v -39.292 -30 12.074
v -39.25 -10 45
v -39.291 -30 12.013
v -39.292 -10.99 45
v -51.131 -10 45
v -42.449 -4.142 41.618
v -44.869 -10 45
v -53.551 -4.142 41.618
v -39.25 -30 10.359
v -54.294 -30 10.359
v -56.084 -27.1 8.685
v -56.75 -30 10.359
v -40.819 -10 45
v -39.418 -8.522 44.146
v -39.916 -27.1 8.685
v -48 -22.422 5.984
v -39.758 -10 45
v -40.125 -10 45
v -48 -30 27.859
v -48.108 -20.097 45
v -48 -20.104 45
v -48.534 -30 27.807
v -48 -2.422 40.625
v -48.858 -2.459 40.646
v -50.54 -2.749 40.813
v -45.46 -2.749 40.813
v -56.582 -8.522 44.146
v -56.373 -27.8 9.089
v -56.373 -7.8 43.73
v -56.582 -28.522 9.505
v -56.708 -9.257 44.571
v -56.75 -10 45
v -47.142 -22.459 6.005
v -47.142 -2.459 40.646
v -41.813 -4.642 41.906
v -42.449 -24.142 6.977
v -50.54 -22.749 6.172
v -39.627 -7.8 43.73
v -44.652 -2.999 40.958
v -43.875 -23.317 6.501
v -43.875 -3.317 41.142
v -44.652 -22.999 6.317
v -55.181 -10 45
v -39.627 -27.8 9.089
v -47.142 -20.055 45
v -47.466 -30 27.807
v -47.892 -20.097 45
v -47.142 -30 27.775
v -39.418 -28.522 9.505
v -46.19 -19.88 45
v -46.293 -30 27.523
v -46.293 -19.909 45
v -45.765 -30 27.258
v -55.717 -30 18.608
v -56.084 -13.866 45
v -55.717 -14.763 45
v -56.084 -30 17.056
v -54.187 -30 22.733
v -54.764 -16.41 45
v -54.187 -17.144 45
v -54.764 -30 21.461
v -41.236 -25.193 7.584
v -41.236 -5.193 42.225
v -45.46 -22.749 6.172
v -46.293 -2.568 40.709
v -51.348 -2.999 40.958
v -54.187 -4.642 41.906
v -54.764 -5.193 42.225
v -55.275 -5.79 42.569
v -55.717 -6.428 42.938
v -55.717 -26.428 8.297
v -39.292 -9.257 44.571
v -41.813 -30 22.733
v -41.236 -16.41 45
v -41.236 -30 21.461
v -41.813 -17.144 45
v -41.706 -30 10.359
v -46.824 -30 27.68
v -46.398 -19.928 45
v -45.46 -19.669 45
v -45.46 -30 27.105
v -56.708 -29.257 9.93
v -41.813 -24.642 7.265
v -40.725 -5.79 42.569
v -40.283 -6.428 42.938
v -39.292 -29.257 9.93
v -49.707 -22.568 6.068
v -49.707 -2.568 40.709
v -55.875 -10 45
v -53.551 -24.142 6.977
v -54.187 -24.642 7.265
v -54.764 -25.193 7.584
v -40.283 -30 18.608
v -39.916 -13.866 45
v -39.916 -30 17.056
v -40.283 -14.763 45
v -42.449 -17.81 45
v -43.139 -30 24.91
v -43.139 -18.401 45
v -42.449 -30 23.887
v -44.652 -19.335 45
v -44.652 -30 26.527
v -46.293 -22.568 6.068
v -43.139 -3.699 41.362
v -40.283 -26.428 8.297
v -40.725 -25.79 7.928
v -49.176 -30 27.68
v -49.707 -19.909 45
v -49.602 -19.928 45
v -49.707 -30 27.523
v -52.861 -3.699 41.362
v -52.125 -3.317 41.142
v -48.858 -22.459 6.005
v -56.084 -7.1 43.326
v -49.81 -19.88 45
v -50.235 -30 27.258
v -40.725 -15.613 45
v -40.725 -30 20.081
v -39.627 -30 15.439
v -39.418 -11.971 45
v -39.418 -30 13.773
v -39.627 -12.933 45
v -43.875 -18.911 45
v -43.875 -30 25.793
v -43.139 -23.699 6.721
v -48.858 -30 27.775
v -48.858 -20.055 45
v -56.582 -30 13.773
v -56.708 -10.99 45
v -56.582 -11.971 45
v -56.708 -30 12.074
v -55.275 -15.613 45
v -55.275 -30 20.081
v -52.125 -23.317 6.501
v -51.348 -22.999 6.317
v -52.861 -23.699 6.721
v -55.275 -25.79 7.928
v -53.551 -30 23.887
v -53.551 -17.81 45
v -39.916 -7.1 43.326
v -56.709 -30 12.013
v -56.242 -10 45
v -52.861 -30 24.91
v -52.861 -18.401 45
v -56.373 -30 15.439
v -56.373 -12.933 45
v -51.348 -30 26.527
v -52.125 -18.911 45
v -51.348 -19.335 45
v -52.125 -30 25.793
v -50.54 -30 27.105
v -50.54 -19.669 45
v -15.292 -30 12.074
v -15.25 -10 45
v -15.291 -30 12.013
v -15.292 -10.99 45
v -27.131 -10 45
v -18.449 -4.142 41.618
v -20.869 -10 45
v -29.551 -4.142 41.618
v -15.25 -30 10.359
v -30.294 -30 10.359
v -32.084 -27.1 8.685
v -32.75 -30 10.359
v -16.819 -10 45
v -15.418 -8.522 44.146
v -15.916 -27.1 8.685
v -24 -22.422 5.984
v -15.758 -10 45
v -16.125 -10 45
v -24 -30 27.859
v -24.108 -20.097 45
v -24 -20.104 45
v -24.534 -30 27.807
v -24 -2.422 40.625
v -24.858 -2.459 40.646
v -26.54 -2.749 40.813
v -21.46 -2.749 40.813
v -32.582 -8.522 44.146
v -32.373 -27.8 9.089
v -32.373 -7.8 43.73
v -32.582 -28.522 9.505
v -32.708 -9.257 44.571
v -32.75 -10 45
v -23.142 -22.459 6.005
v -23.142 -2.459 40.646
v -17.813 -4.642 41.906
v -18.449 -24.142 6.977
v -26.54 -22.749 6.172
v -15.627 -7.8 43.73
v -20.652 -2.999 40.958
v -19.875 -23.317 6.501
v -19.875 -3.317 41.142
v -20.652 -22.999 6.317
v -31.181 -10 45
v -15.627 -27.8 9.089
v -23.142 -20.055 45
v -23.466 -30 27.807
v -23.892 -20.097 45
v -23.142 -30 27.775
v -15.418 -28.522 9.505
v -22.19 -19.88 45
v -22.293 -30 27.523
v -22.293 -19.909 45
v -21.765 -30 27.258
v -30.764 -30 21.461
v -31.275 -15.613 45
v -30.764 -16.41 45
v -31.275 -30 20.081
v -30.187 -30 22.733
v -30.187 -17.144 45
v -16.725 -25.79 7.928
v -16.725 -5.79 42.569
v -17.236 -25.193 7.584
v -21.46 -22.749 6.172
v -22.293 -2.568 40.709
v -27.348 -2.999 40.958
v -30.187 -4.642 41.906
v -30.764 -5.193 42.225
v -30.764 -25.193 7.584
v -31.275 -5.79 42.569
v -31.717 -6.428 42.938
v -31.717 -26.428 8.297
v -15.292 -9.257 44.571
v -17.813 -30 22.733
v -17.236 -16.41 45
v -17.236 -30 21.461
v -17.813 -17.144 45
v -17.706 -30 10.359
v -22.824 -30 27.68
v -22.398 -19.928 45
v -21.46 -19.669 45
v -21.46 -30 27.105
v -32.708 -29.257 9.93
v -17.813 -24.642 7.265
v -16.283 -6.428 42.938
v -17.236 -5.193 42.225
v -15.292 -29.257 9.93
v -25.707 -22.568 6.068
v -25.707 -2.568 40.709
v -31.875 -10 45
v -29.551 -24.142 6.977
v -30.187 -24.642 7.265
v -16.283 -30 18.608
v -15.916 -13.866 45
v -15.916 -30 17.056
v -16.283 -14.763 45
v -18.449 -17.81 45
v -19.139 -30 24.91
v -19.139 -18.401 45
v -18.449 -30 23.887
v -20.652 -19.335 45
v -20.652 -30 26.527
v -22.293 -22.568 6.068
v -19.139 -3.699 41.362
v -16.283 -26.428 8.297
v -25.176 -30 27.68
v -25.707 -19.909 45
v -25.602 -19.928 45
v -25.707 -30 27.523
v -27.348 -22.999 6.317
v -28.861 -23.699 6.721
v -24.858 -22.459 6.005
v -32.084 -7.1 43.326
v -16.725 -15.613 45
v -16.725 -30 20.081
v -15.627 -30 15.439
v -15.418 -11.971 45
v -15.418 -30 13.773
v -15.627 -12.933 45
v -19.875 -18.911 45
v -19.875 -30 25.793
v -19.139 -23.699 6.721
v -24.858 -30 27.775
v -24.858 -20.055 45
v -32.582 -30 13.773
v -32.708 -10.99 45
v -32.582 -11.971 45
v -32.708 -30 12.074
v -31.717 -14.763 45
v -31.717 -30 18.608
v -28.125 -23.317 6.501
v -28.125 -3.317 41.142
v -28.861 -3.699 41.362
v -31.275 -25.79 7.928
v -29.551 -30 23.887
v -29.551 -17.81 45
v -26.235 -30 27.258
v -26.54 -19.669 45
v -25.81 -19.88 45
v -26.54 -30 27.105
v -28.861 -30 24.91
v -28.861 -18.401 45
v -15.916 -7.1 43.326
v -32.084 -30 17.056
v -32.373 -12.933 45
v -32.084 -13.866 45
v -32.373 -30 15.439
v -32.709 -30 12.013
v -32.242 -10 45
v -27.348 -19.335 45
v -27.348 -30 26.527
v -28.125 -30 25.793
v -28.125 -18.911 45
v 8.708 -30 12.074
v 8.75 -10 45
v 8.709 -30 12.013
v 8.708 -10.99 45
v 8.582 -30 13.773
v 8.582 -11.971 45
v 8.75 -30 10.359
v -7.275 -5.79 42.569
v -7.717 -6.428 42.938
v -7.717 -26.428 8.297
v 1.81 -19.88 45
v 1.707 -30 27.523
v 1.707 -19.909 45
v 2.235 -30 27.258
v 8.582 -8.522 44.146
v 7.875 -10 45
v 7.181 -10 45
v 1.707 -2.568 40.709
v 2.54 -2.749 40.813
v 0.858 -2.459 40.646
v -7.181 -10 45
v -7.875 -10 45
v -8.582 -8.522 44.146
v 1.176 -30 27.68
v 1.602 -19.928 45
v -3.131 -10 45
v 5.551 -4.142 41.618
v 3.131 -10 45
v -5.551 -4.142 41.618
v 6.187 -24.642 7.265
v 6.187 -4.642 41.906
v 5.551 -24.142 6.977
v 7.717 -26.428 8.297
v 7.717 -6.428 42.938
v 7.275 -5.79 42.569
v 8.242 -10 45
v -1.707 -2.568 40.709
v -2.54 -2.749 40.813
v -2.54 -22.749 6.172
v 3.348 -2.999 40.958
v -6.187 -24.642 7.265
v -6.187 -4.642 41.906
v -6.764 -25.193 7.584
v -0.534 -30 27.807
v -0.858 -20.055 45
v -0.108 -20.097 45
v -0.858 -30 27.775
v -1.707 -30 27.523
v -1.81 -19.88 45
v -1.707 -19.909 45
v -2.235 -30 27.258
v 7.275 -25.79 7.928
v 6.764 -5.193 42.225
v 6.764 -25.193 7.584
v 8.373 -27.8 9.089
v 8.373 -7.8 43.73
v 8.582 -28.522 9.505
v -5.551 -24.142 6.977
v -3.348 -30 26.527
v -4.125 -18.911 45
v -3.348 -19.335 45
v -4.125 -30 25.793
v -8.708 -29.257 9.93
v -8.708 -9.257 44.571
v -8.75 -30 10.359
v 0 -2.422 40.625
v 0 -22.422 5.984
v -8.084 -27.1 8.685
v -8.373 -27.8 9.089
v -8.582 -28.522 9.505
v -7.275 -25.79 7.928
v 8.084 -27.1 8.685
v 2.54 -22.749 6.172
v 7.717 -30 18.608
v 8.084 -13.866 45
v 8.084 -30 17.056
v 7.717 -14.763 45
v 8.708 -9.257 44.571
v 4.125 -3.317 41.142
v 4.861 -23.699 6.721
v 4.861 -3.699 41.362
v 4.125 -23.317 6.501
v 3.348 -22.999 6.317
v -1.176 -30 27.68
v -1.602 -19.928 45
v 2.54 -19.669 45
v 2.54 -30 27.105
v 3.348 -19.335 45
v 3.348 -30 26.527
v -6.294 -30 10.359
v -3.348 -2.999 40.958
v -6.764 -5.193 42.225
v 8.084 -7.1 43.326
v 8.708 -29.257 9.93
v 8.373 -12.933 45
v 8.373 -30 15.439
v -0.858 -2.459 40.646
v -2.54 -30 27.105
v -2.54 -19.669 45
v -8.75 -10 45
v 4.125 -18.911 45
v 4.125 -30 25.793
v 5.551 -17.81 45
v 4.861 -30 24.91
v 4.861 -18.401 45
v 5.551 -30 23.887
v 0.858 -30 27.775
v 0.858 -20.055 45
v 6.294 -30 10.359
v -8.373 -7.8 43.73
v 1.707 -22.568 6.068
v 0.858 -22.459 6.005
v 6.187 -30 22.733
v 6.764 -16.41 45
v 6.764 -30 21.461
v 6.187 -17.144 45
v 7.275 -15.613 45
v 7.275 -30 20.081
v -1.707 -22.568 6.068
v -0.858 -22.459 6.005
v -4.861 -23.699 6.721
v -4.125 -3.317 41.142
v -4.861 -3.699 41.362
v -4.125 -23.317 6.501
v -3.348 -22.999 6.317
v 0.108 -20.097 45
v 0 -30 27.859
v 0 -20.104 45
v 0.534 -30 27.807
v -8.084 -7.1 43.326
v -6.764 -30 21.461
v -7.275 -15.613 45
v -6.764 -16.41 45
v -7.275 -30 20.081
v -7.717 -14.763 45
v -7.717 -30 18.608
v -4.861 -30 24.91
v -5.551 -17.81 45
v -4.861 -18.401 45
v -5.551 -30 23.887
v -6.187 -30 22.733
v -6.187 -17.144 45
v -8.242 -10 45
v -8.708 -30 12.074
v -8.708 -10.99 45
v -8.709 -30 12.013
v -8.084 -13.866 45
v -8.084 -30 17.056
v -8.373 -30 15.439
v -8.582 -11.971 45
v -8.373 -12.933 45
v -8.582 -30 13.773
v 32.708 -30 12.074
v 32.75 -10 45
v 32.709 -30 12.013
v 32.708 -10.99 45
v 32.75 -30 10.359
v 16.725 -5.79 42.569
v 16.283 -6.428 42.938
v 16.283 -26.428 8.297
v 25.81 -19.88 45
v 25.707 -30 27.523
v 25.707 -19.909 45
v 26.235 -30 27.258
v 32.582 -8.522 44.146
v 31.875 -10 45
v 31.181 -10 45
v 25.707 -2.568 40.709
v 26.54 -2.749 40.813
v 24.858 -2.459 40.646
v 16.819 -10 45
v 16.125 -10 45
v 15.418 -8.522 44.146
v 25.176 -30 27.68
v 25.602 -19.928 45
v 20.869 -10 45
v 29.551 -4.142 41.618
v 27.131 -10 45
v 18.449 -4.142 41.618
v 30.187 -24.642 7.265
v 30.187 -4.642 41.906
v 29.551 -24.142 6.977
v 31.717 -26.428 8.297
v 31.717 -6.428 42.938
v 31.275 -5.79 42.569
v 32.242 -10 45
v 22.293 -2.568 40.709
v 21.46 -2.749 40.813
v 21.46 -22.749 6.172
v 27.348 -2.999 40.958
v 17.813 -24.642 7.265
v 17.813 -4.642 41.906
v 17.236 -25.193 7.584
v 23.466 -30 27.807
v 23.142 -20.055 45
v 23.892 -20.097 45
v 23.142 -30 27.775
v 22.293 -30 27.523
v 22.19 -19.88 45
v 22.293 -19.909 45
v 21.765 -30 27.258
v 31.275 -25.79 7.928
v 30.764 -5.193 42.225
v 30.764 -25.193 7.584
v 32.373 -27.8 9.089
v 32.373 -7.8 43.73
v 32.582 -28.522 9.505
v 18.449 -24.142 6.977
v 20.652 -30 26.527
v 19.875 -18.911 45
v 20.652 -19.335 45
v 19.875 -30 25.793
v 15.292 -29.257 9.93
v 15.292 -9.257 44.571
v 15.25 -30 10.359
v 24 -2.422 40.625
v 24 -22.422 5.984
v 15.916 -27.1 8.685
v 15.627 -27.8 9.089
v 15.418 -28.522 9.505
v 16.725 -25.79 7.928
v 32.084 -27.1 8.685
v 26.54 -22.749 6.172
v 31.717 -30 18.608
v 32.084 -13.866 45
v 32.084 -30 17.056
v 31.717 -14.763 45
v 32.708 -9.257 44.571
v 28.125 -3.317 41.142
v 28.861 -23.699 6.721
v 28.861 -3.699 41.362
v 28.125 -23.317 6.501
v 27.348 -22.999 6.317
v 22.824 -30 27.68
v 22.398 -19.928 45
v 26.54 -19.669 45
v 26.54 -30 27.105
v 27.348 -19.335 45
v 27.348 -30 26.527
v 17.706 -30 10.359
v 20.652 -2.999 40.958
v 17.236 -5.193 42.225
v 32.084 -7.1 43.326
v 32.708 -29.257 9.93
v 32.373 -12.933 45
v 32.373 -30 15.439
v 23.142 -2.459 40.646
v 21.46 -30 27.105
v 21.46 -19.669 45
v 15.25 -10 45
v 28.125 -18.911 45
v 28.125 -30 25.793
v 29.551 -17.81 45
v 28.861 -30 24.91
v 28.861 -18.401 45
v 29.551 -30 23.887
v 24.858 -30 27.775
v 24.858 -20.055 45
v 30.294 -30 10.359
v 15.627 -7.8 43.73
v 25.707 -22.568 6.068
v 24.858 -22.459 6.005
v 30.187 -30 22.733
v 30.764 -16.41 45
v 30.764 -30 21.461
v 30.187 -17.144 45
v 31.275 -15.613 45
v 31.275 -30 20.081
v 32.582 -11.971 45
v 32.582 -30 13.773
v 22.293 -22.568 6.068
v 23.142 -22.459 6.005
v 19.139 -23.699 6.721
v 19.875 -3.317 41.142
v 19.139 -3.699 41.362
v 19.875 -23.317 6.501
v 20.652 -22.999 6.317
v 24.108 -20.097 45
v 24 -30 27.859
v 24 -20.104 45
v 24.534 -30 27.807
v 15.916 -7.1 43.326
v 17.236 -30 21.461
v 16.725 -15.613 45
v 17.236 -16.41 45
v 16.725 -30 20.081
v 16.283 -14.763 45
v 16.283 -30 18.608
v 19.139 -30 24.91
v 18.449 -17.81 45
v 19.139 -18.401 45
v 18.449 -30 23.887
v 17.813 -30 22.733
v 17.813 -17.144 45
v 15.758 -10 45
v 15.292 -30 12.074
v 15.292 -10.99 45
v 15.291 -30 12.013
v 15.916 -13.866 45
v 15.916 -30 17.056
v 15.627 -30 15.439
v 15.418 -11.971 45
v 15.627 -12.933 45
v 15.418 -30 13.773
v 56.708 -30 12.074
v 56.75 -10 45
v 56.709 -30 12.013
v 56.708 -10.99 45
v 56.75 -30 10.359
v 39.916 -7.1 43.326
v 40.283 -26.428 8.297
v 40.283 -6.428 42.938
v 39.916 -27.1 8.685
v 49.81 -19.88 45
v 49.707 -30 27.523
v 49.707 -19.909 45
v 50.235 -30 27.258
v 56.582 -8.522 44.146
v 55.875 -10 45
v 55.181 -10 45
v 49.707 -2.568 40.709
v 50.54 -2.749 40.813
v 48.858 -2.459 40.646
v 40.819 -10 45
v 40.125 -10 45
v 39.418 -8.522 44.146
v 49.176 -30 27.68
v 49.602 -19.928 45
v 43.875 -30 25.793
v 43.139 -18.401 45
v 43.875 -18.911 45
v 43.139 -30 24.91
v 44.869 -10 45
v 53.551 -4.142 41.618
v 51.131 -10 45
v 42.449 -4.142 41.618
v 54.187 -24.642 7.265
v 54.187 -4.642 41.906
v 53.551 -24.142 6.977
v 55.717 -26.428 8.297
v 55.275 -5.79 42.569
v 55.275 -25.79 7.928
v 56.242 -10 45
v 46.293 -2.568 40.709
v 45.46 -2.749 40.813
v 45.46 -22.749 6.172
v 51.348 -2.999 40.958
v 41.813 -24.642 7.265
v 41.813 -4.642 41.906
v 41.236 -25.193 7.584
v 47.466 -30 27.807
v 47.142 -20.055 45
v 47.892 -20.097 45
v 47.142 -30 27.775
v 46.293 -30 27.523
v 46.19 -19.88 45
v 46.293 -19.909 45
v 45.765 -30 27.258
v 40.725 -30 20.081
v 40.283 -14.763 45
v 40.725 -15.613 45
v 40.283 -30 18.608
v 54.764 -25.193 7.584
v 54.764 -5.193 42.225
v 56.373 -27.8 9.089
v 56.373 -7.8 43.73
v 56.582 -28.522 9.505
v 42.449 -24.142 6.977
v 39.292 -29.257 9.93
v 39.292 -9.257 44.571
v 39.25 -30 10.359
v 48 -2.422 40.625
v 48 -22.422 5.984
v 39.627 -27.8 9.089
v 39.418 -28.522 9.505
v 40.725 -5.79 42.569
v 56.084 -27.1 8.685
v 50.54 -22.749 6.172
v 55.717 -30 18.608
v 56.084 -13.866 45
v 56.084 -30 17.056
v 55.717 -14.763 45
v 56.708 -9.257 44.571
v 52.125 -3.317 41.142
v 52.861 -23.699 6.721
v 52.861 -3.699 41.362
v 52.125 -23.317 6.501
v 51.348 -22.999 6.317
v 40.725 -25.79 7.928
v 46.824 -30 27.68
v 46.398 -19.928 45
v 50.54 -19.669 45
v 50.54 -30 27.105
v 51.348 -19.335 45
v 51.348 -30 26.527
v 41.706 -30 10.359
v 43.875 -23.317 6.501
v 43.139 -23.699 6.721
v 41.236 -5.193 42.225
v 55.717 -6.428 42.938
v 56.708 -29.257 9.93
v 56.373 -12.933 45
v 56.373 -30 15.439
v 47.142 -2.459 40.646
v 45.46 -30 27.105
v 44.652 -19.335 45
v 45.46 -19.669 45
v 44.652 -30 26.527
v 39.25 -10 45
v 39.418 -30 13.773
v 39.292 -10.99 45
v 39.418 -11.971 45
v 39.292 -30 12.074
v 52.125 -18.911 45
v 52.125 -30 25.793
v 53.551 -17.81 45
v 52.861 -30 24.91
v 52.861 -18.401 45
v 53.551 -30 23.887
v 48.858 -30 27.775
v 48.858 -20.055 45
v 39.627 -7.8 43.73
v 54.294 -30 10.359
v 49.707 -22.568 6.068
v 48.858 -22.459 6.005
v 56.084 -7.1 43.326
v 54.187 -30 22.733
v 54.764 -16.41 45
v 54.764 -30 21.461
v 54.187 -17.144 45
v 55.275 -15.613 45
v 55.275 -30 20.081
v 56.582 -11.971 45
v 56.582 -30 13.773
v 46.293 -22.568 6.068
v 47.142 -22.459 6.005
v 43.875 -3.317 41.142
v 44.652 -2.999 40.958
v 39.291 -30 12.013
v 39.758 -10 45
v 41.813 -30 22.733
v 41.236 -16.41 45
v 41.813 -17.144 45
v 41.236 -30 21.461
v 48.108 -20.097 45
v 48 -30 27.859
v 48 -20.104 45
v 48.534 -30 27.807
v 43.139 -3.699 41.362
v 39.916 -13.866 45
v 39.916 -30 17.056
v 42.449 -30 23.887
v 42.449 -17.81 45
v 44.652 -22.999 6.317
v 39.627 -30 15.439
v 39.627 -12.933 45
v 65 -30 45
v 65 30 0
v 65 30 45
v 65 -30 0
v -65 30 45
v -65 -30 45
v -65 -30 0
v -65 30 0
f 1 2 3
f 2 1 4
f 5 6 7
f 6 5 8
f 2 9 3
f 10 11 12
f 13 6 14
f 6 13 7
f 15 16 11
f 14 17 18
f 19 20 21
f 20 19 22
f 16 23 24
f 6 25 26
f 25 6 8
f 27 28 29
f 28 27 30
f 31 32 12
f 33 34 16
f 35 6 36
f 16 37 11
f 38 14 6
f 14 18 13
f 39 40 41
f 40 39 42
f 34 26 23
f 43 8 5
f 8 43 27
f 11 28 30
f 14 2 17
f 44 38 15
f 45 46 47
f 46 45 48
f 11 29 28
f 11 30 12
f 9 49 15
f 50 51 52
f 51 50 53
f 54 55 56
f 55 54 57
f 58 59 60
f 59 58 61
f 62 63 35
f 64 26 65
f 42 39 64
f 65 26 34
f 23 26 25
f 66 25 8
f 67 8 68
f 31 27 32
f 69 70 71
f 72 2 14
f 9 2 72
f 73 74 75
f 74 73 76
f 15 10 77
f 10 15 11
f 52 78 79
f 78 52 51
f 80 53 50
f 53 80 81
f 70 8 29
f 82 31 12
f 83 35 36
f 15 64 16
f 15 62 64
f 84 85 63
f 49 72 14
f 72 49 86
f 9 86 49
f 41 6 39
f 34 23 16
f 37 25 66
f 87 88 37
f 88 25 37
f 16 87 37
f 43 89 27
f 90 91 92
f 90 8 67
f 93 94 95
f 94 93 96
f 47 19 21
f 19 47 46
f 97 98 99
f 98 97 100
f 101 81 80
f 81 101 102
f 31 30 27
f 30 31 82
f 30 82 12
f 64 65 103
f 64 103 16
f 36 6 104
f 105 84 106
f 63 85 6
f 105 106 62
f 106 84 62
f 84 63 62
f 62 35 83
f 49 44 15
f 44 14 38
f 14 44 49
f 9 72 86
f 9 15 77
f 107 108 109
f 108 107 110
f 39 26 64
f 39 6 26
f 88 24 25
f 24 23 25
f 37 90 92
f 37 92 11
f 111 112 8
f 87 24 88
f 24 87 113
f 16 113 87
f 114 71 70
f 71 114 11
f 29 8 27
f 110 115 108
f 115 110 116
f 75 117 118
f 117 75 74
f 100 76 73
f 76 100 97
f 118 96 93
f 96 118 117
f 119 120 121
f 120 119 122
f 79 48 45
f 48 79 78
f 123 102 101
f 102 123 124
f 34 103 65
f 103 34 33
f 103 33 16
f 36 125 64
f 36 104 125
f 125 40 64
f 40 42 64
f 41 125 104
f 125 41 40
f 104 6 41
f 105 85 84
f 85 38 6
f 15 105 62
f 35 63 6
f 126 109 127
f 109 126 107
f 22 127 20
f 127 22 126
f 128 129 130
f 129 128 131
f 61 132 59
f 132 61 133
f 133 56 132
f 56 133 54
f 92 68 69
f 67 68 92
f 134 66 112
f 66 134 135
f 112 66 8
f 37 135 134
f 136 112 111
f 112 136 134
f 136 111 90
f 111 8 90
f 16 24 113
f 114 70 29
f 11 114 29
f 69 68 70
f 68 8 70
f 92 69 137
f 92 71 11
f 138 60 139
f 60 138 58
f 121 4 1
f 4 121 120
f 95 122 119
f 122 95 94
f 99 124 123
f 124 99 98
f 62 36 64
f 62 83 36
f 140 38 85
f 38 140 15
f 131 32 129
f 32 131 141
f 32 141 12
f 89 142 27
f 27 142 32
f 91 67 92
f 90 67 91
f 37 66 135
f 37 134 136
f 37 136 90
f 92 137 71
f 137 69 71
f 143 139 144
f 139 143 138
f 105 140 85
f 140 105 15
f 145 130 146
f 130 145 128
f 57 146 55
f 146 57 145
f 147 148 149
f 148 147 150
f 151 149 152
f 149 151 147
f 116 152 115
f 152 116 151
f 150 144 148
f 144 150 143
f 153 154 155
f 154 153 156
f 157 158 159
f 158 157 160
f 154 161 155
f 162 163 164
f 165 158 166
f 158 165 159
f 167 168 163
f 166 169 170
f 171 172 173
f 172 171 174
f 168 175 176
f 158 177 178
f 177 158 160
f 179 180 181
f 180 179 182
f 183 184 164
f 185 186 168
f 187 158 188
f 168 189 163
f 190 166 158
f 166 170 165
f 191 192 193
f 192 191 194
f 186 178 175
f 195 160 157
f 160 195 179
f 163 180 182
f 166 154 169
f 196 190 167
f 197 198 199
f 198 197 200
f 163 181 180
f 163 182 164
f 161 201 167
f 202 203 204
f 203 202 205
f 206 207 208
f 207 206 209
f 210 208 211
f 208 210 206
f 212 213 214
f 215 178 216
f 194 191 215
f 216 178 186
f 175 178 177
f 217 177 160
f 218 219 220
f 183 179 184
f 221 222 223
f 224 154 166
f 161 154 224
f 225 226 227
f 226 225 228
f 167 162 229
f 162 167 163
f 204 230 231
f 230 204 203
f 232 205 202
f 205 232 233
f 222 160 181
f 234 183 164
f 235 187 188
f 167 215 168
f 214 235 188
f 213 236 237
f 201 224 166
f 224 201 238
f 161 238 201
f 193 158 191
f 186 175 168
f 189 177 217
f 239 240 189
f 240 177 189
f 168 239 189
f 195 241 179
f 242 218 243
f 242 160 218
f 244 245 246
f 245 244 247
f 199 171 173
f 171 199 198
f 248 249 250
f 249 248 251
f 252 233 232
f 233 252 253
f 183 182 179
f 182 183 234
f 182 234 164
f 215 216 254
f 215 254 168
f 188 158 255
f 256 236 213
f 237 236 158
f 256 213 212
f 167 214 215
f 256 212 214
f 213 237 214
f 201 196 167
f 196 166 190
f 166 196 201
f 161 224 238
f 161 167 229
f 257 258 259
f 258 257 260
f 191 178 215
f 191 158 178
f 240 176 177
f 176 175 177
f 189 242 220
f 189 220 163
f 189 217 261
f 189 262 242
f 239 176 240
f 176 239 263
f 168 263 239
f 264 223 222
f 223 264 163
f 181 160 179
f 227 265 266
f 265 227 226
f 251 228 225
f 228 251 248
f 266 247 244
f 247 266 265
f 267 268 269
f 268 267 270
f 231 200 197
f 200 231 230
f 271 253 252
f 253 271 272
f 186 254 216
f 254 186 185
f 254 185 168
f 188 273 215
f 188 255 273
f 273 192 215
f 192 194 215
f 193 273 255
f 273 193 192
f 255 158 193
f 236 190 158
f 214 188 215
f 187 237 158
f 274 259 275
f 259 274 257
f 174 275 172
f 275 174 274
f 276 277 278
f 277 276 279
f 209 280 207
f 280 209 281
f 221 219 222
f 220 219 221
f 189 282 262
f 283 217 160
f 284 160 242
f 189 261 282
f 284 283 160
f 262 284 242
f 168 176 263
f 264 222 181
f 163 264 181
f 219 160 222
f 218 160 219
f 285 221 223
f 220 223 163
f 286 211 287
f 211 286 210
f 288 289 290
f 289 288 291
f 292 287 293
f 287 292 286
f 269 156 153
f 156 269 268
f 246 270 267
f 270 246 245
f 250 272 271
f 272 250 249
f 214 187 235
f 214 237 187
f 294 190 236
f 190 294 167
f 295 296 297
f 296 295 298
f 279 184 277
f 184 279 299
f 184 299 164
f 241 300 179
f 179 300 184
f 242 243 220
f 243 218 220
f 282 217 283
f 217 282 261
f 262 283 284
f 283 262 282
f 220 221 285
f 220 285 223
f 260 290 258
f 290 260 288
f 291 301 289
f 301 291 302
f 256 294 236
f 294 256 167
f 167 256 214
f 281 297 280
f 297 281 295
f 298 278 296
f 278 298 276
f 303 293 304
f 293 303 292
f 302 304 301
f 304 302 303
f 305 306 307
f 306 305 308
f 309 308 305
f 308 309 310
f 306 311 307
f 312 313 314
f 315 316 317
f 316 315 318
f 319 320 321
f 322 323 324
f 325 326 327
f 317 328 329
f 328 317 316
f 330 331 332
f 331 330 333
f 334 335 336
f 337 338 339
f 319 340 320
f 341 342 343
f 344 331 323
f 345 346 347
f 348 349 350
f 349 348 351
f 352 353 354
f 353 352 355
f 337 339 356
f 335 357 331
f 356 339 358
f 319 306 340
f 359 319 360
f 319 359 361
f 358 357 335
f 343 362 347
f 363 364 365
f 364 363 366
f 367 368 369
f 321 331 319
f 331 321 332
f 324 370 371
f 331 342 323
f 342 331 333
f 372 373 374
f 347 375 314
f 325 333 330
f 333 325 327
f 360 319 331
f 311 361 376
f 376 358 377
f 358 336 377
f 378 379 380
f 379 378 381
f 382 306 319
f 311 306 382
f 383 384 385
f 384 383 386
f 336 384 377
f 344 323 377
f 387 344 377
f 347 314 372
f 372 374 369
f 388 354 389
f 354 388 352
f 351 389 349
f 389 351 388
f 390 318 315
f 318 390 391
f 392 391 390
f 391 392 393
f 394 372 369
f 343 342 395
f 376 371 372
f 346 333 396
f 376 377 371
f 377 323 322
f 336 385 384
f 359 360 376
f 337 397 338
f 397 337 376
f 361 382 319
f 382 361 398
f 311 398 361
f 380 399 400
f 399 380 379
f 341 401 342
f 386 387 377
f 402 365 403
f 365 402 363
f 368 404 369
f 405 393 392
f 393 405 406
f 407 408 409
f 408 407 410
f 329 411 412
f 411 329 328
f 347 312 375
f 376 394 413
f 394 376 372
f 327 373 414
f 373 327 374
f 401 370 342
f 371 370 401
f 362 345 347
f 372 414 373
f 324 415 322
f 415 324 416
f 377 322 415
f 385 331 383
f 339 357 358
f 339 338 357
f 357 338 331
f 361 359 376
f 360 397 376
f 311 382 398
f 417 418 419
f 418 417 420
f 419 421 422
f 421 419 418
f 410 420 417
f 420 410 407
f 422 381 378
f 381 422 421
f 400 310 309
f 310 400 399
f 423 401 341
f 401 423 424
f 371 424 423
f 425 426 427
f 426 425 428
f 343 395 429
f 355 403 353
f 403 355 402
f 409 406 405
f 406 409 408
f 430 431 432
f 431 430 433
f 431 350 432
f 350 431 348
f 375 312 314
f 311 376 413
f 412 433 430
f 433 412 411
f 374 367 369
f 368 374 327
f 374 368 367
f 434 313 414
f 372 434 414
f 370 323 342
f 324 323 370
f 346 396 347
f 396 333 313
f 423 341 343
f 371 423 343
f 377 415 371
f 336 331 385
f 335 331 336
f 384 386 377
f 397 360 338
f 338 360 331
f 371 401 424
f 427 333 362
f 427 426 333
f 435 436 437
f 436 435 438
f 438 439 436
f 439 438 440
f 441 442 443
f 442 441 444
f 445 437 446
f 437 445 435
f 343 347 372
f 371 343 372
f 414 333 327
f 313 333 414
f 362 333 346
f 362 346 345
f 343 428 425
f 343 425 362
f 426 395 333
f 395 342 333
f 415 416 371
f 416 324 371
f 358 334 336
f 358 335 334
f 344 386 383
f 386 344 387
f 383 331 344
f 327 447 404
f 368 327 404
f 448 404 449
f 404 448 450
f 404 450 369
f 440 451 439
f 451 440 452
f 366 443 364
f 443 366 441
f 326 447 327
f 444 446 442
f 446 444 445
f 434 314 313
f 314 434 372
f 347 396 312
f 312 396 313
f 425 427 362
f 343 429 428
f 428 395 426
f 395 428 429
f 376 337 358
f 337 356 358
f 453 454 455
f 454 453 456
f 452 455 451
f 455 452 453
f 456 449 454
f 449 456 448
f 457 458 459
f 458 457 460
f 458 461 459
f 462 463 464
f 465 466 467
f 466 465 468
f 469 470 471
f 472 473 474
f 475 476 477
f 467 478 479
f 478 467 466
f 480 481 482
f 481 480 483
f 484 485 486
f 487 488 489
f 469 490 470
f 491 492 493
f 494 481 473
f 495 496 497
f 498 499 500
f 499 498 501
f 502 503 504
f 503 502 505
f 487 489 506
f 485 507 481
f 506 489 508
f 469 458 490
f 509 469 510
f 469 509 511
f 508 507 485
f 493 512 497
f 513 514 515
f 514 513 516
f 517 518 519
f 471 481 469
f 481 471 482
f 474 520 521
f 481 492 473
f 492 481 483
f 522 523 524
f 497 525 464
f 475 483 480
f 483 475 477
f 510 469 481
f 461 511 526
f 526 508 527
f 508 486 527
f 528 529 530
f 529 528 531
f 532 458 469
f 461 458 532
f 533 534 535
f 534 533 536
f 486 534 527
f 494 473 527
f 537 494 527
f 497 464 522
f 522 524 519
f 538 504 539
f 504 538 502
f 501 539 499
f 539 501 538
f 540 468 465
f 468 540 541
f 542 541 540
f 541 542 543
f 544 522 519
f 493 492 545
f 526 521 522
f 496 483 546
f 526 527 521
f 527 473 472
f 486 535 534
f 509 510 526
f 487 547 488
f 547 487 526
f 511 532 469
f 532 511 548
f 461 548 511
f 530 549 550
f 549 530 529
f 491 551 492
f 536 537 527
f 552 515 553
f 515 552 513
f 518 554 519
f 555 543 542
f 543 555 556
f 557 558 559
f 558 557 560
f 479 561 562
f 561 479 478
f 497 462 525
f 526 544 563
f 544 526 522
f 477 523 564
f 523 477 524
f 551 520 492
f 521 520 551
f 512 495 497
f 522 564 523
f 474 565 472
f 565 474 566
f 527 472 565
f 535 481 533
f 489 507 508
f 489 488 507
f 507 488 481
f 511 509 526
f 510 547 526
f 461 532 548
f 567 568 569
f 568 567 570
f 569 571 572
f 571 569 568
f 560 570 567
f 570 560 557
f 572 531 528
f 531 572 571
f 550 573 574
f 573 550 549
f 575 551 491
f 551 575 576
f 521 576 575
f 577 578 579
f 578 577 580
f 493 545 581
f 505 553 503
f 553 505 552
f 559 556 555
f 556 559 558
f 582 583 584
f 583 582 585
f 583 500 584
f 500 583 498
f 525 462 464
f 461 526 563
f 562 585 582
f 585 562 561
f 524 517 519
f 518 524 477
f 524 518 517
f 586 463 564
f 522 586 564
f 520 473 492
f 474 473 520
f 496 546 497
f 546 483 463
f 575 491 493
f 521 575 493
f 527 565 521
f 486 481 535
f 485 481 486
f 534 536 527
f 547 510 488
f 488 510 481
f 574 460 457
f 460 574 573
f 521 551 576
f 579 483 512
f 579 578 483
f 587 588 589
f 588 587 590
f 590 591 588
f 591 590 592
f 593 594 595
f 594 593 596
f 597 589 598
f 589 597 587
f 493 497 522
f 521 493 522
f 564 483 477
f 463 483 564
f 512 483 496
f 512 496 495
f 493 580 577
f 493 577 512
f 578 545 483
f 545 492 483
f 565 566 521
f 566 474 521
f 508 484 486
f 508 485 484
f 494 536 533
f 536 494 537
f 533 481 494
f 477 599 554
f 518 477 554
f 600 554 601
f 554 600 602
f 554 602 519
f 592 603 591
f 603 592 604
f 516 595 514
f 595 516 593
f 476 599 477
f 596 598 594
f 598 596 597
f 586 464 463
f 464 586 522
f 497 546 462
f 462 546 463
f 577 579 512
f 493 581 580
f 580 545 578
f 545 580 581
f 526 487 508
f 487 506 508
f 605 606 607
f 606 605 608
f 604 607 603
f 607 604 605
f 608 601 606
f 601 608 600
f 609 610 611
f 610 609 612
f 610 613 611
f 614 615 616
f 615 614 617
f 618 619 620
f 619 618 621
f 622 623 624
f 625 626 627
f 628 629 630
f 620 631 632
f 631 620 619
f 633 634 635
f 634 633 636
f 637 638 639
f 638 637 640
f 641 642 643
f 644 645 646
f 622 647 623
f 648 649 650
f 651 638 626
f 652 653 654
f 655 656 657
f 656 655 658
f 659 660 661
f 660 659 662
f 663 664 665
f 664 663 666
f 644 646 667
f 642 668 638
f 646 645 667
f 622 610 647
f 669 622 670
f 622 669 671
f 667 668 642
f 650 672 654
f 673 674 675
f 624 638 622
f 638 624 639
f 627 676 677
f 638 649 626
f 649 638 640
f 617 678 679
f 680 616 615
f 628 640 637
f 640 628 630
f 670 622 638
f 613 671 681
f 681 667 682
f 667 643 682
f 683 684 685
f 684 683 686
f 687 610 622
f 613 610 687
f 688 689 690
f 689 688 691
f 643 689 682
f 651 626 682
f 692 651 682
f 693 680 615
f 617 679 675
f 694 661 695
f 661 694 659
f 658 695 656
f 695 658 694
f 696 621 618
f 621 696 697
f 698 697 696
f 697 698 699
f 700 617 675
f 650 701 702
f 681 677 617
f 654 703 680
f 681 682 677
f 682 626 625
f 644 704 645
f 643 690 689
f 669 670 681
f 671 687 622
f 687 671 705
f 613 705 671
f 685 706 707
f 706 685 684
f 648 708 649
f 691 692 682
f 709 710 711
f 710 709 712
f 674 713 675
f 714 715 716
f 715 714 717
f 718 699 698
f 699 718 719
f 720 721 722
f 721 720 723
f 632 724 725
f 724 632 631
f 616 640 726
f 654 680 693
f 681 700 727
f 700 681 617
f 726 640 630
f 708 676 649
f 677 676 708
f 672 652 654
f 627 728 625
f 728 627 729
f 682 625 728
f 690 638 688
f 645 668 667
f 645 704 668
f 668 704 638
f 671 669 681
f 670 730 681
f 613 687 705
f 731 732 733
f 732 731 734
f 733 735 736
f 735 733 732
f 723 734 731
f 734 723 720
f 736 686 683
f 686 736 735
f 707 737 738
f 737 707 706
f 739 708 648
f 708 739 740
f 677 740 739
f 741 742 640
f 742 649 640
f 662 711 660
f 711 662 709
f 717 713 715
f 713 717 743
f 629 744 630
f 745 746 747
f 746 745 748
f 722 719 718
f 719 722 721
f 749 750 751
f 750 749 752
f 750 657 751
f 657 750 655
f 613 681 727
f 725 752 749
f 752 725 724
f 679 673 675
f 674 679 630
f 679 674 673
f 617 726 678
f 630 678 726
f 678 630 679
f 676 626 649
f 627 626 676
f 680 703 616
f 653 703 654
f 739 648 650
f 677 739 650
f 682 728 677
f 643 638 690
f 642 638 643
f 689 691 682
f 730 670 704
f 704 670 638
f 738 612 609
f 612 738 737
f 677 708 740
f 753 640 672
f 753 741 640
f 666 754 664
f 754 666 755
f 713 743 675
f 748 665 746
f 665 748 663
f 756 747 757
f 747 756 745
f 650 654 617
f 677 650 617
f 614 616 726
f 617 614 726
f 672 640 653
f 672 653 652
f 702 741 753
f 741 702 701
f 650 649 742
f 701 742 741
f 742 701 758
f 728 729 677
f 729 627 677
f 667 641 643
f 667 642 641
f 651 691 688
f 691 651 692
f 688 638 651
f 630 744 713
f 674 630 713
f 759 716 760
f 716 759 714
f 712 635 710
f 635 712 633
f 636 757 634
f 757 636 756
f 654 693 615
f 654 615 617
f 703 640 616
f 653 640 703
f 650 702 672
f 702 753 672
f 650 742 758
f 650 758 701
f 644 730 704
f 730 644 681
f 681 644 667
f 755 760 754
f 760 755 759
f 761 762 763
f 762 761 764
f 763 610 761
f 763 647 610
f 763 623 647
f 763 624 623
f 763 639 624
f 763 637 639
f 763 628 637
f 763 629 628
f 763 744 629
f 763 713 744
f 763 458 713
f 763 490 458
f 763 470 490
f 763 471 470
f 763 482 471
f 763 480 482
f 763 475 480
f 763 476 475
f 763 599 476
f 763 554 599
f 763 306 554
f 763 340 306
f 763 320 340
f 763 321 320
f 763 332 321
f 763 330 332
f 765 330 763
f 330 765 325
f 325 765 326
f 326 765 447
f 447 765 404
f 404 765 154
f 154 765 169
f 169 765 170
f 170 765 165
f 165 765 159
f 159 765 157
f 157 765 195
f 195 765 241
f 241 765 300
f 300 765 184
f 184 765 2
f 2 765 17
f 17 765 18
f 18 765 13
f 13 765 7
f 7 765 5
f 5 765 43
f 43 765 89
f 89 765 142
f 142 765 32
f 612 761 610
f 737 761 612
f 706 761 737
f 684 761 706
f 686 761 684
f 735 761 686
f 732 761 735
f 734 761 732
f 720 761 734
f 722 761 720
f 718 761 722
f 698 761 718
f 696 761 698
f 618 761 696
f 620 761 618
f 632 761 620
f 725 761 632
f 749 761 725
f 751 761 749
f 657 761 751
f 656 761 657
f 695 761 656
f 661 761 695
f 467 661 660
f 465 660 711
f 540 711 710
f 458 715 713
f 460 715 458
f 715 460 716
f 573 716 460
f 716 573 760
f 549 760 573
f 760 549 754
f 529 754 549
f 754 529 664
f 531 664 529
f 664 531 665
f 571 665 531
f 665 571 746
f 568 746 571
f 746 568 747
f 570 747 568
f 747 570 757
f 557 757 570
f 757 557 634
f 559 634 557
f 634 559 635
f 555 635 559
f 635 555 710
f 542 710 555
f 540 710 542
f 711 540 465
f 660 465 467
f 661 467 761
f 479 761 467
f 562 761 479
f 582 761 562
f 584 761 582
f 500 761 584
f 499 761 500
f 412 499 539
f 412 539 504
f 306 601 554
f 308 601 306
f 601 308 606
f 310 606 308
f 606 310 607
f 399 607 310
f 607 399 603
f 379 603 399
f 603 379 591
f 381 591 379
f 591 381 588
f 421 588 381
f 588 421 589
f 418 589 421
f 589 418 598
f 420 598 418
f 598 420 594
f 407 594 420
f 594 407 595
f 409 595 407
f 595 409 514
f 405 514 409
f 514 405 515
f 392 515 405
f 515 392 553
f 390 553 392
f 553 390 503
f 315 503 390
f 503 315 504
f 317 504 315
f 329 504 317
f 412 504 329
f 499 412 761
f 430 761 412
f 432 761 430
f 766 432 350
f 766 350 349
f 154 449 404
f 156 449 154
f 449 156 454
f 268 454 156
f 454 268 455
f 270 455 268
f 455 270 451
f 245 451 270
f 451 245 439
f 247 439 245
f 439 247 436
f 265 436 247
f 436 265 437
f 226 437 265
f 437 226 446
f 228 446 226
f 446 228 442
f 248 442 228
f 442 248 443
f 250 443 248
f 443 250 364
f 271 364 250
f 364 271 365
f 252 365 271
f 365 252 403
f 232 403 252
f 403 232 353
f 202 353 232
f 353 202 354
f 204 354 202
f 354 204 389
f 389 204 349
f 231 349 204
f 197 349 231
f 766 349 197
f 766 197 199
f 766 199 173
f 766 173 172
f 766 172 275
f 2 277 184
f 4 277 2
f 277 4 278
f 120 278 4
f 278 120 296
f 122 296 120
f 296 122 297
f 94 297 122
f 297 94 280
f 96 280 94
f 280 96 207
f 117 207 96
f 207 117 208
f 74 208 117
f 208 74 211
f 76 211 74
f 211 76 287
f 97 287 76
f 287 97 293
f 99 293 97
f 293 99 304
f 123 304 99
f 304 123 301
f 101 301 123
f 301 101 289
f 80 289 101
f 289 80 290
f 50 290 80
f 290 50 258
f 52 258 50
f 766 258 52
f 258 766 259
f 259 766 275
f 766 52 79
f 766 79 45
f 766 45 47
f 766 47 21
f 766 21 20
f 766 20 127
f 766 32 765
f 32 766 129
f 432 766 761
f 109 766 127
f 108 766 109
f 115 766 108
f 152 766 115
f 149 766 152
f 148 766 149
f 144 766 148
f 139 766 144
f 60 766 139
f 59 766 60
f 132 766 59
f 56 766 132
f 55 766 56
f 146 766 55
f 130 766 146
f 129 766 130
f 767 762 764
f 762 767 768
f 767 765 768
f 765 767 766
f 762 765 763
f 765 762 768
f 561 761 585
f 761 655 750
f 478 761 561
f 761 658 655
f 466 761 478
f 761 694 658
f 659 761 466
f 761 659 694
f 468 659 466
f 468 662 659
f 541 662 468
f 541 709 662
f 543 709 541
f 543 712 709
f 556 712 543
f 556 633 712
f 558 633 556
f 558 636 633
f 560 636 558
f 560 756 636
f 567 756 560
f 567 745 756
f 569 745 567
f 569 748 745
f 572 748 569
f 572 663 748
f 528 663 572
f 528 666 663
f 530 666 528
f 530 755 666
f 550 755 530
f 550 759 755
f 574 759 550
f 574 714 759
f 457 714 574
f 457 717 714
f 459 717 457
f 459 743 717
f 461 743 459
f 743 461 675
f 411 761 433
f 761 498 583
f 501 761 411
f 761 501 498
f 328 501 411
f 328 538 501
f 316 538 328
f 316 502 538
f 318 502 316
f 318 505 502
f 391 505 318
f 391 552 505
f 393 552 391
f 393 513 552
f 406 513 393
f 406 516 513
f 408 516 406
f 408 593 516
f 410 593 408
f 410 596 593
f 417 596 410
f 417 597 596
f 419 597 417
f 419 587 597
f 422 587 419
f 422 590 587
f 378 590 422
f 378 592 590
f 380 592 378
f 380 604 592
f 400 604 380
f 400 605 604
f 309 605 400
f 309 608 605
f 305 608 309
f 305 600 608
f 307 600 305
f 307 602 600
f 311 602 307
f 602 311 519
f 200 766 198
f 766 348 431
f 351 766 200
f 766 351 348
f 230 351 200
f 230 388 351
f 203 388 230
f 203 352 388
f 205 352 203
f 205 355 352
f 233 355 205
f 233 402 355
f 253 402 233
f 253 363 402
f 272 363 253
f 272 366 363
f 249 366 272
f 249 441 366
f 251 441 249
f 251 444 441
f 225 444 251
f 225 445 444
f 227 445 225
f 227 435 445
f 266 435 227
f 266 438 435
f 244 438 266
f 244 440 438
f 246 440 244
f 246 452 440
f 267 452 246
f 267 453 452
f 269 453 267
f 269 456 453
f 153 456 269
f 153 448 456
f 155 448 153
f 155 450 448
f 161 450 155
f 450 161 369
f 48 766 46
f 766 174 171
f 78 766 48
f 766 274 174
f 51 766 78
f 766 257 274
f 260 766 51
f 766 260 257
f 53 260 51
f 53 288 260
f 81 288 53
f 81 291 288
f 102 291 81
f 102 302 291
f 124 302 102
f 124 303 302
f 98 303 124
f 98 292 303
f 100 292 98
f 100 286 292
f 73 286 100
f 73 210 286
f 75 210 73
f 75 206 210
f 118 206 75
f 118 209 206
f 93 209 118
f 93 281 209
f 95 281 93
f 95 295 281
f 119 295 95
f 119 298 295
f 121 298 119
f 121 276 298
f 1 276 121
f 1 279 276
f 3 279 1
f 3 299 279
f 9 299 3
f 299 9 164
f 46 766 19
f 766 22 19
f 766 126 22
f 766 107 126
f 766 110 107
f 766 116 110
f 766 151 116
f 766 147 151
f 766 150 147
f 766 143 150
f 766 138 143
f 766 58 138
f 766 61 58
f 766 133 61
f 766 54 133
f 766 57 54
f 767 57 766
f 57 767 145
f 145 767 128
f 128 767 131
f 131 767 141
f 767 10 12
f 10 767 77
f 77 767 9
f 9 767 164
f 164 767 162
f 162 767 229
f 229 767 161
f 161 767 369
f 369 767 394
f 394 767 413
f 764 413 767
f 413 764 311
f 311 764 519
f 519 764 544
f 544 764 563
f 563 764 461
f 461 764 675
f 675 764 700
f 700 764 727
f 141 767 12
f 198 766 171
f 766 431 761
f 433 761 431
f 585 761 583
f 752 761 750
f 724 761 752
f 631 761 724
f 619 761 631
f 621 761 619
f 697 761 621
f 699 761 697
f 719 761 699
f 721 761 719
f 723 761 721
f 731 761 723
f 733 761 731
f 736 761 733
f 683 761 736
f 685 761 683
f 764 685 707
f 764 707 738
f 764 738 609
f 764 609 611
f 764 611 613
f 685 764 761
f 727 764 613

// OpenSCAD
// Dimensions
block_length = 130;      // X dimension
block_depth = 60;        // Y dimension
block_height = 45;       // Z dimension
hole_diameter = 17.5;    // diameter of each hole
hole_radius = hole_diameter / 2;
hole_depth = 40;         // depth along the axis
hole_count = 5;
hole_spacing = 24;       // spacing between hole centers (X direction)
y_opening = -10;         // Y position where hole opens
fn_value = 64;           // fragment number for smooth curves

// Calculate hole positions along X
total_span = (hole_count - 1) * hole_spacing;
start_x = -total_span / 2;

// Main structure with five angled holes
difference() {
    // Solid rectangular block
    translate([-block_length / 2, -block_depth / 2, 0])
        cube([block_length, block_depth, block_height]);
    
    // Subtract the five blind holes
    for (i = [0 : hole_count - 1]) {
        x_pos = start_x + i * hole_spacing;
        
        // Each hole: cylinder rotated 150° around X-axis
        // (30° from vertical, tilting toward +Y as it goes down)
        translate([x_pos, y_opening, block_height])
        rotate([150, 0, 0])
        cylinder(r=hole_radius, h=hole_depth, $fn=fn_value);
    }
}
